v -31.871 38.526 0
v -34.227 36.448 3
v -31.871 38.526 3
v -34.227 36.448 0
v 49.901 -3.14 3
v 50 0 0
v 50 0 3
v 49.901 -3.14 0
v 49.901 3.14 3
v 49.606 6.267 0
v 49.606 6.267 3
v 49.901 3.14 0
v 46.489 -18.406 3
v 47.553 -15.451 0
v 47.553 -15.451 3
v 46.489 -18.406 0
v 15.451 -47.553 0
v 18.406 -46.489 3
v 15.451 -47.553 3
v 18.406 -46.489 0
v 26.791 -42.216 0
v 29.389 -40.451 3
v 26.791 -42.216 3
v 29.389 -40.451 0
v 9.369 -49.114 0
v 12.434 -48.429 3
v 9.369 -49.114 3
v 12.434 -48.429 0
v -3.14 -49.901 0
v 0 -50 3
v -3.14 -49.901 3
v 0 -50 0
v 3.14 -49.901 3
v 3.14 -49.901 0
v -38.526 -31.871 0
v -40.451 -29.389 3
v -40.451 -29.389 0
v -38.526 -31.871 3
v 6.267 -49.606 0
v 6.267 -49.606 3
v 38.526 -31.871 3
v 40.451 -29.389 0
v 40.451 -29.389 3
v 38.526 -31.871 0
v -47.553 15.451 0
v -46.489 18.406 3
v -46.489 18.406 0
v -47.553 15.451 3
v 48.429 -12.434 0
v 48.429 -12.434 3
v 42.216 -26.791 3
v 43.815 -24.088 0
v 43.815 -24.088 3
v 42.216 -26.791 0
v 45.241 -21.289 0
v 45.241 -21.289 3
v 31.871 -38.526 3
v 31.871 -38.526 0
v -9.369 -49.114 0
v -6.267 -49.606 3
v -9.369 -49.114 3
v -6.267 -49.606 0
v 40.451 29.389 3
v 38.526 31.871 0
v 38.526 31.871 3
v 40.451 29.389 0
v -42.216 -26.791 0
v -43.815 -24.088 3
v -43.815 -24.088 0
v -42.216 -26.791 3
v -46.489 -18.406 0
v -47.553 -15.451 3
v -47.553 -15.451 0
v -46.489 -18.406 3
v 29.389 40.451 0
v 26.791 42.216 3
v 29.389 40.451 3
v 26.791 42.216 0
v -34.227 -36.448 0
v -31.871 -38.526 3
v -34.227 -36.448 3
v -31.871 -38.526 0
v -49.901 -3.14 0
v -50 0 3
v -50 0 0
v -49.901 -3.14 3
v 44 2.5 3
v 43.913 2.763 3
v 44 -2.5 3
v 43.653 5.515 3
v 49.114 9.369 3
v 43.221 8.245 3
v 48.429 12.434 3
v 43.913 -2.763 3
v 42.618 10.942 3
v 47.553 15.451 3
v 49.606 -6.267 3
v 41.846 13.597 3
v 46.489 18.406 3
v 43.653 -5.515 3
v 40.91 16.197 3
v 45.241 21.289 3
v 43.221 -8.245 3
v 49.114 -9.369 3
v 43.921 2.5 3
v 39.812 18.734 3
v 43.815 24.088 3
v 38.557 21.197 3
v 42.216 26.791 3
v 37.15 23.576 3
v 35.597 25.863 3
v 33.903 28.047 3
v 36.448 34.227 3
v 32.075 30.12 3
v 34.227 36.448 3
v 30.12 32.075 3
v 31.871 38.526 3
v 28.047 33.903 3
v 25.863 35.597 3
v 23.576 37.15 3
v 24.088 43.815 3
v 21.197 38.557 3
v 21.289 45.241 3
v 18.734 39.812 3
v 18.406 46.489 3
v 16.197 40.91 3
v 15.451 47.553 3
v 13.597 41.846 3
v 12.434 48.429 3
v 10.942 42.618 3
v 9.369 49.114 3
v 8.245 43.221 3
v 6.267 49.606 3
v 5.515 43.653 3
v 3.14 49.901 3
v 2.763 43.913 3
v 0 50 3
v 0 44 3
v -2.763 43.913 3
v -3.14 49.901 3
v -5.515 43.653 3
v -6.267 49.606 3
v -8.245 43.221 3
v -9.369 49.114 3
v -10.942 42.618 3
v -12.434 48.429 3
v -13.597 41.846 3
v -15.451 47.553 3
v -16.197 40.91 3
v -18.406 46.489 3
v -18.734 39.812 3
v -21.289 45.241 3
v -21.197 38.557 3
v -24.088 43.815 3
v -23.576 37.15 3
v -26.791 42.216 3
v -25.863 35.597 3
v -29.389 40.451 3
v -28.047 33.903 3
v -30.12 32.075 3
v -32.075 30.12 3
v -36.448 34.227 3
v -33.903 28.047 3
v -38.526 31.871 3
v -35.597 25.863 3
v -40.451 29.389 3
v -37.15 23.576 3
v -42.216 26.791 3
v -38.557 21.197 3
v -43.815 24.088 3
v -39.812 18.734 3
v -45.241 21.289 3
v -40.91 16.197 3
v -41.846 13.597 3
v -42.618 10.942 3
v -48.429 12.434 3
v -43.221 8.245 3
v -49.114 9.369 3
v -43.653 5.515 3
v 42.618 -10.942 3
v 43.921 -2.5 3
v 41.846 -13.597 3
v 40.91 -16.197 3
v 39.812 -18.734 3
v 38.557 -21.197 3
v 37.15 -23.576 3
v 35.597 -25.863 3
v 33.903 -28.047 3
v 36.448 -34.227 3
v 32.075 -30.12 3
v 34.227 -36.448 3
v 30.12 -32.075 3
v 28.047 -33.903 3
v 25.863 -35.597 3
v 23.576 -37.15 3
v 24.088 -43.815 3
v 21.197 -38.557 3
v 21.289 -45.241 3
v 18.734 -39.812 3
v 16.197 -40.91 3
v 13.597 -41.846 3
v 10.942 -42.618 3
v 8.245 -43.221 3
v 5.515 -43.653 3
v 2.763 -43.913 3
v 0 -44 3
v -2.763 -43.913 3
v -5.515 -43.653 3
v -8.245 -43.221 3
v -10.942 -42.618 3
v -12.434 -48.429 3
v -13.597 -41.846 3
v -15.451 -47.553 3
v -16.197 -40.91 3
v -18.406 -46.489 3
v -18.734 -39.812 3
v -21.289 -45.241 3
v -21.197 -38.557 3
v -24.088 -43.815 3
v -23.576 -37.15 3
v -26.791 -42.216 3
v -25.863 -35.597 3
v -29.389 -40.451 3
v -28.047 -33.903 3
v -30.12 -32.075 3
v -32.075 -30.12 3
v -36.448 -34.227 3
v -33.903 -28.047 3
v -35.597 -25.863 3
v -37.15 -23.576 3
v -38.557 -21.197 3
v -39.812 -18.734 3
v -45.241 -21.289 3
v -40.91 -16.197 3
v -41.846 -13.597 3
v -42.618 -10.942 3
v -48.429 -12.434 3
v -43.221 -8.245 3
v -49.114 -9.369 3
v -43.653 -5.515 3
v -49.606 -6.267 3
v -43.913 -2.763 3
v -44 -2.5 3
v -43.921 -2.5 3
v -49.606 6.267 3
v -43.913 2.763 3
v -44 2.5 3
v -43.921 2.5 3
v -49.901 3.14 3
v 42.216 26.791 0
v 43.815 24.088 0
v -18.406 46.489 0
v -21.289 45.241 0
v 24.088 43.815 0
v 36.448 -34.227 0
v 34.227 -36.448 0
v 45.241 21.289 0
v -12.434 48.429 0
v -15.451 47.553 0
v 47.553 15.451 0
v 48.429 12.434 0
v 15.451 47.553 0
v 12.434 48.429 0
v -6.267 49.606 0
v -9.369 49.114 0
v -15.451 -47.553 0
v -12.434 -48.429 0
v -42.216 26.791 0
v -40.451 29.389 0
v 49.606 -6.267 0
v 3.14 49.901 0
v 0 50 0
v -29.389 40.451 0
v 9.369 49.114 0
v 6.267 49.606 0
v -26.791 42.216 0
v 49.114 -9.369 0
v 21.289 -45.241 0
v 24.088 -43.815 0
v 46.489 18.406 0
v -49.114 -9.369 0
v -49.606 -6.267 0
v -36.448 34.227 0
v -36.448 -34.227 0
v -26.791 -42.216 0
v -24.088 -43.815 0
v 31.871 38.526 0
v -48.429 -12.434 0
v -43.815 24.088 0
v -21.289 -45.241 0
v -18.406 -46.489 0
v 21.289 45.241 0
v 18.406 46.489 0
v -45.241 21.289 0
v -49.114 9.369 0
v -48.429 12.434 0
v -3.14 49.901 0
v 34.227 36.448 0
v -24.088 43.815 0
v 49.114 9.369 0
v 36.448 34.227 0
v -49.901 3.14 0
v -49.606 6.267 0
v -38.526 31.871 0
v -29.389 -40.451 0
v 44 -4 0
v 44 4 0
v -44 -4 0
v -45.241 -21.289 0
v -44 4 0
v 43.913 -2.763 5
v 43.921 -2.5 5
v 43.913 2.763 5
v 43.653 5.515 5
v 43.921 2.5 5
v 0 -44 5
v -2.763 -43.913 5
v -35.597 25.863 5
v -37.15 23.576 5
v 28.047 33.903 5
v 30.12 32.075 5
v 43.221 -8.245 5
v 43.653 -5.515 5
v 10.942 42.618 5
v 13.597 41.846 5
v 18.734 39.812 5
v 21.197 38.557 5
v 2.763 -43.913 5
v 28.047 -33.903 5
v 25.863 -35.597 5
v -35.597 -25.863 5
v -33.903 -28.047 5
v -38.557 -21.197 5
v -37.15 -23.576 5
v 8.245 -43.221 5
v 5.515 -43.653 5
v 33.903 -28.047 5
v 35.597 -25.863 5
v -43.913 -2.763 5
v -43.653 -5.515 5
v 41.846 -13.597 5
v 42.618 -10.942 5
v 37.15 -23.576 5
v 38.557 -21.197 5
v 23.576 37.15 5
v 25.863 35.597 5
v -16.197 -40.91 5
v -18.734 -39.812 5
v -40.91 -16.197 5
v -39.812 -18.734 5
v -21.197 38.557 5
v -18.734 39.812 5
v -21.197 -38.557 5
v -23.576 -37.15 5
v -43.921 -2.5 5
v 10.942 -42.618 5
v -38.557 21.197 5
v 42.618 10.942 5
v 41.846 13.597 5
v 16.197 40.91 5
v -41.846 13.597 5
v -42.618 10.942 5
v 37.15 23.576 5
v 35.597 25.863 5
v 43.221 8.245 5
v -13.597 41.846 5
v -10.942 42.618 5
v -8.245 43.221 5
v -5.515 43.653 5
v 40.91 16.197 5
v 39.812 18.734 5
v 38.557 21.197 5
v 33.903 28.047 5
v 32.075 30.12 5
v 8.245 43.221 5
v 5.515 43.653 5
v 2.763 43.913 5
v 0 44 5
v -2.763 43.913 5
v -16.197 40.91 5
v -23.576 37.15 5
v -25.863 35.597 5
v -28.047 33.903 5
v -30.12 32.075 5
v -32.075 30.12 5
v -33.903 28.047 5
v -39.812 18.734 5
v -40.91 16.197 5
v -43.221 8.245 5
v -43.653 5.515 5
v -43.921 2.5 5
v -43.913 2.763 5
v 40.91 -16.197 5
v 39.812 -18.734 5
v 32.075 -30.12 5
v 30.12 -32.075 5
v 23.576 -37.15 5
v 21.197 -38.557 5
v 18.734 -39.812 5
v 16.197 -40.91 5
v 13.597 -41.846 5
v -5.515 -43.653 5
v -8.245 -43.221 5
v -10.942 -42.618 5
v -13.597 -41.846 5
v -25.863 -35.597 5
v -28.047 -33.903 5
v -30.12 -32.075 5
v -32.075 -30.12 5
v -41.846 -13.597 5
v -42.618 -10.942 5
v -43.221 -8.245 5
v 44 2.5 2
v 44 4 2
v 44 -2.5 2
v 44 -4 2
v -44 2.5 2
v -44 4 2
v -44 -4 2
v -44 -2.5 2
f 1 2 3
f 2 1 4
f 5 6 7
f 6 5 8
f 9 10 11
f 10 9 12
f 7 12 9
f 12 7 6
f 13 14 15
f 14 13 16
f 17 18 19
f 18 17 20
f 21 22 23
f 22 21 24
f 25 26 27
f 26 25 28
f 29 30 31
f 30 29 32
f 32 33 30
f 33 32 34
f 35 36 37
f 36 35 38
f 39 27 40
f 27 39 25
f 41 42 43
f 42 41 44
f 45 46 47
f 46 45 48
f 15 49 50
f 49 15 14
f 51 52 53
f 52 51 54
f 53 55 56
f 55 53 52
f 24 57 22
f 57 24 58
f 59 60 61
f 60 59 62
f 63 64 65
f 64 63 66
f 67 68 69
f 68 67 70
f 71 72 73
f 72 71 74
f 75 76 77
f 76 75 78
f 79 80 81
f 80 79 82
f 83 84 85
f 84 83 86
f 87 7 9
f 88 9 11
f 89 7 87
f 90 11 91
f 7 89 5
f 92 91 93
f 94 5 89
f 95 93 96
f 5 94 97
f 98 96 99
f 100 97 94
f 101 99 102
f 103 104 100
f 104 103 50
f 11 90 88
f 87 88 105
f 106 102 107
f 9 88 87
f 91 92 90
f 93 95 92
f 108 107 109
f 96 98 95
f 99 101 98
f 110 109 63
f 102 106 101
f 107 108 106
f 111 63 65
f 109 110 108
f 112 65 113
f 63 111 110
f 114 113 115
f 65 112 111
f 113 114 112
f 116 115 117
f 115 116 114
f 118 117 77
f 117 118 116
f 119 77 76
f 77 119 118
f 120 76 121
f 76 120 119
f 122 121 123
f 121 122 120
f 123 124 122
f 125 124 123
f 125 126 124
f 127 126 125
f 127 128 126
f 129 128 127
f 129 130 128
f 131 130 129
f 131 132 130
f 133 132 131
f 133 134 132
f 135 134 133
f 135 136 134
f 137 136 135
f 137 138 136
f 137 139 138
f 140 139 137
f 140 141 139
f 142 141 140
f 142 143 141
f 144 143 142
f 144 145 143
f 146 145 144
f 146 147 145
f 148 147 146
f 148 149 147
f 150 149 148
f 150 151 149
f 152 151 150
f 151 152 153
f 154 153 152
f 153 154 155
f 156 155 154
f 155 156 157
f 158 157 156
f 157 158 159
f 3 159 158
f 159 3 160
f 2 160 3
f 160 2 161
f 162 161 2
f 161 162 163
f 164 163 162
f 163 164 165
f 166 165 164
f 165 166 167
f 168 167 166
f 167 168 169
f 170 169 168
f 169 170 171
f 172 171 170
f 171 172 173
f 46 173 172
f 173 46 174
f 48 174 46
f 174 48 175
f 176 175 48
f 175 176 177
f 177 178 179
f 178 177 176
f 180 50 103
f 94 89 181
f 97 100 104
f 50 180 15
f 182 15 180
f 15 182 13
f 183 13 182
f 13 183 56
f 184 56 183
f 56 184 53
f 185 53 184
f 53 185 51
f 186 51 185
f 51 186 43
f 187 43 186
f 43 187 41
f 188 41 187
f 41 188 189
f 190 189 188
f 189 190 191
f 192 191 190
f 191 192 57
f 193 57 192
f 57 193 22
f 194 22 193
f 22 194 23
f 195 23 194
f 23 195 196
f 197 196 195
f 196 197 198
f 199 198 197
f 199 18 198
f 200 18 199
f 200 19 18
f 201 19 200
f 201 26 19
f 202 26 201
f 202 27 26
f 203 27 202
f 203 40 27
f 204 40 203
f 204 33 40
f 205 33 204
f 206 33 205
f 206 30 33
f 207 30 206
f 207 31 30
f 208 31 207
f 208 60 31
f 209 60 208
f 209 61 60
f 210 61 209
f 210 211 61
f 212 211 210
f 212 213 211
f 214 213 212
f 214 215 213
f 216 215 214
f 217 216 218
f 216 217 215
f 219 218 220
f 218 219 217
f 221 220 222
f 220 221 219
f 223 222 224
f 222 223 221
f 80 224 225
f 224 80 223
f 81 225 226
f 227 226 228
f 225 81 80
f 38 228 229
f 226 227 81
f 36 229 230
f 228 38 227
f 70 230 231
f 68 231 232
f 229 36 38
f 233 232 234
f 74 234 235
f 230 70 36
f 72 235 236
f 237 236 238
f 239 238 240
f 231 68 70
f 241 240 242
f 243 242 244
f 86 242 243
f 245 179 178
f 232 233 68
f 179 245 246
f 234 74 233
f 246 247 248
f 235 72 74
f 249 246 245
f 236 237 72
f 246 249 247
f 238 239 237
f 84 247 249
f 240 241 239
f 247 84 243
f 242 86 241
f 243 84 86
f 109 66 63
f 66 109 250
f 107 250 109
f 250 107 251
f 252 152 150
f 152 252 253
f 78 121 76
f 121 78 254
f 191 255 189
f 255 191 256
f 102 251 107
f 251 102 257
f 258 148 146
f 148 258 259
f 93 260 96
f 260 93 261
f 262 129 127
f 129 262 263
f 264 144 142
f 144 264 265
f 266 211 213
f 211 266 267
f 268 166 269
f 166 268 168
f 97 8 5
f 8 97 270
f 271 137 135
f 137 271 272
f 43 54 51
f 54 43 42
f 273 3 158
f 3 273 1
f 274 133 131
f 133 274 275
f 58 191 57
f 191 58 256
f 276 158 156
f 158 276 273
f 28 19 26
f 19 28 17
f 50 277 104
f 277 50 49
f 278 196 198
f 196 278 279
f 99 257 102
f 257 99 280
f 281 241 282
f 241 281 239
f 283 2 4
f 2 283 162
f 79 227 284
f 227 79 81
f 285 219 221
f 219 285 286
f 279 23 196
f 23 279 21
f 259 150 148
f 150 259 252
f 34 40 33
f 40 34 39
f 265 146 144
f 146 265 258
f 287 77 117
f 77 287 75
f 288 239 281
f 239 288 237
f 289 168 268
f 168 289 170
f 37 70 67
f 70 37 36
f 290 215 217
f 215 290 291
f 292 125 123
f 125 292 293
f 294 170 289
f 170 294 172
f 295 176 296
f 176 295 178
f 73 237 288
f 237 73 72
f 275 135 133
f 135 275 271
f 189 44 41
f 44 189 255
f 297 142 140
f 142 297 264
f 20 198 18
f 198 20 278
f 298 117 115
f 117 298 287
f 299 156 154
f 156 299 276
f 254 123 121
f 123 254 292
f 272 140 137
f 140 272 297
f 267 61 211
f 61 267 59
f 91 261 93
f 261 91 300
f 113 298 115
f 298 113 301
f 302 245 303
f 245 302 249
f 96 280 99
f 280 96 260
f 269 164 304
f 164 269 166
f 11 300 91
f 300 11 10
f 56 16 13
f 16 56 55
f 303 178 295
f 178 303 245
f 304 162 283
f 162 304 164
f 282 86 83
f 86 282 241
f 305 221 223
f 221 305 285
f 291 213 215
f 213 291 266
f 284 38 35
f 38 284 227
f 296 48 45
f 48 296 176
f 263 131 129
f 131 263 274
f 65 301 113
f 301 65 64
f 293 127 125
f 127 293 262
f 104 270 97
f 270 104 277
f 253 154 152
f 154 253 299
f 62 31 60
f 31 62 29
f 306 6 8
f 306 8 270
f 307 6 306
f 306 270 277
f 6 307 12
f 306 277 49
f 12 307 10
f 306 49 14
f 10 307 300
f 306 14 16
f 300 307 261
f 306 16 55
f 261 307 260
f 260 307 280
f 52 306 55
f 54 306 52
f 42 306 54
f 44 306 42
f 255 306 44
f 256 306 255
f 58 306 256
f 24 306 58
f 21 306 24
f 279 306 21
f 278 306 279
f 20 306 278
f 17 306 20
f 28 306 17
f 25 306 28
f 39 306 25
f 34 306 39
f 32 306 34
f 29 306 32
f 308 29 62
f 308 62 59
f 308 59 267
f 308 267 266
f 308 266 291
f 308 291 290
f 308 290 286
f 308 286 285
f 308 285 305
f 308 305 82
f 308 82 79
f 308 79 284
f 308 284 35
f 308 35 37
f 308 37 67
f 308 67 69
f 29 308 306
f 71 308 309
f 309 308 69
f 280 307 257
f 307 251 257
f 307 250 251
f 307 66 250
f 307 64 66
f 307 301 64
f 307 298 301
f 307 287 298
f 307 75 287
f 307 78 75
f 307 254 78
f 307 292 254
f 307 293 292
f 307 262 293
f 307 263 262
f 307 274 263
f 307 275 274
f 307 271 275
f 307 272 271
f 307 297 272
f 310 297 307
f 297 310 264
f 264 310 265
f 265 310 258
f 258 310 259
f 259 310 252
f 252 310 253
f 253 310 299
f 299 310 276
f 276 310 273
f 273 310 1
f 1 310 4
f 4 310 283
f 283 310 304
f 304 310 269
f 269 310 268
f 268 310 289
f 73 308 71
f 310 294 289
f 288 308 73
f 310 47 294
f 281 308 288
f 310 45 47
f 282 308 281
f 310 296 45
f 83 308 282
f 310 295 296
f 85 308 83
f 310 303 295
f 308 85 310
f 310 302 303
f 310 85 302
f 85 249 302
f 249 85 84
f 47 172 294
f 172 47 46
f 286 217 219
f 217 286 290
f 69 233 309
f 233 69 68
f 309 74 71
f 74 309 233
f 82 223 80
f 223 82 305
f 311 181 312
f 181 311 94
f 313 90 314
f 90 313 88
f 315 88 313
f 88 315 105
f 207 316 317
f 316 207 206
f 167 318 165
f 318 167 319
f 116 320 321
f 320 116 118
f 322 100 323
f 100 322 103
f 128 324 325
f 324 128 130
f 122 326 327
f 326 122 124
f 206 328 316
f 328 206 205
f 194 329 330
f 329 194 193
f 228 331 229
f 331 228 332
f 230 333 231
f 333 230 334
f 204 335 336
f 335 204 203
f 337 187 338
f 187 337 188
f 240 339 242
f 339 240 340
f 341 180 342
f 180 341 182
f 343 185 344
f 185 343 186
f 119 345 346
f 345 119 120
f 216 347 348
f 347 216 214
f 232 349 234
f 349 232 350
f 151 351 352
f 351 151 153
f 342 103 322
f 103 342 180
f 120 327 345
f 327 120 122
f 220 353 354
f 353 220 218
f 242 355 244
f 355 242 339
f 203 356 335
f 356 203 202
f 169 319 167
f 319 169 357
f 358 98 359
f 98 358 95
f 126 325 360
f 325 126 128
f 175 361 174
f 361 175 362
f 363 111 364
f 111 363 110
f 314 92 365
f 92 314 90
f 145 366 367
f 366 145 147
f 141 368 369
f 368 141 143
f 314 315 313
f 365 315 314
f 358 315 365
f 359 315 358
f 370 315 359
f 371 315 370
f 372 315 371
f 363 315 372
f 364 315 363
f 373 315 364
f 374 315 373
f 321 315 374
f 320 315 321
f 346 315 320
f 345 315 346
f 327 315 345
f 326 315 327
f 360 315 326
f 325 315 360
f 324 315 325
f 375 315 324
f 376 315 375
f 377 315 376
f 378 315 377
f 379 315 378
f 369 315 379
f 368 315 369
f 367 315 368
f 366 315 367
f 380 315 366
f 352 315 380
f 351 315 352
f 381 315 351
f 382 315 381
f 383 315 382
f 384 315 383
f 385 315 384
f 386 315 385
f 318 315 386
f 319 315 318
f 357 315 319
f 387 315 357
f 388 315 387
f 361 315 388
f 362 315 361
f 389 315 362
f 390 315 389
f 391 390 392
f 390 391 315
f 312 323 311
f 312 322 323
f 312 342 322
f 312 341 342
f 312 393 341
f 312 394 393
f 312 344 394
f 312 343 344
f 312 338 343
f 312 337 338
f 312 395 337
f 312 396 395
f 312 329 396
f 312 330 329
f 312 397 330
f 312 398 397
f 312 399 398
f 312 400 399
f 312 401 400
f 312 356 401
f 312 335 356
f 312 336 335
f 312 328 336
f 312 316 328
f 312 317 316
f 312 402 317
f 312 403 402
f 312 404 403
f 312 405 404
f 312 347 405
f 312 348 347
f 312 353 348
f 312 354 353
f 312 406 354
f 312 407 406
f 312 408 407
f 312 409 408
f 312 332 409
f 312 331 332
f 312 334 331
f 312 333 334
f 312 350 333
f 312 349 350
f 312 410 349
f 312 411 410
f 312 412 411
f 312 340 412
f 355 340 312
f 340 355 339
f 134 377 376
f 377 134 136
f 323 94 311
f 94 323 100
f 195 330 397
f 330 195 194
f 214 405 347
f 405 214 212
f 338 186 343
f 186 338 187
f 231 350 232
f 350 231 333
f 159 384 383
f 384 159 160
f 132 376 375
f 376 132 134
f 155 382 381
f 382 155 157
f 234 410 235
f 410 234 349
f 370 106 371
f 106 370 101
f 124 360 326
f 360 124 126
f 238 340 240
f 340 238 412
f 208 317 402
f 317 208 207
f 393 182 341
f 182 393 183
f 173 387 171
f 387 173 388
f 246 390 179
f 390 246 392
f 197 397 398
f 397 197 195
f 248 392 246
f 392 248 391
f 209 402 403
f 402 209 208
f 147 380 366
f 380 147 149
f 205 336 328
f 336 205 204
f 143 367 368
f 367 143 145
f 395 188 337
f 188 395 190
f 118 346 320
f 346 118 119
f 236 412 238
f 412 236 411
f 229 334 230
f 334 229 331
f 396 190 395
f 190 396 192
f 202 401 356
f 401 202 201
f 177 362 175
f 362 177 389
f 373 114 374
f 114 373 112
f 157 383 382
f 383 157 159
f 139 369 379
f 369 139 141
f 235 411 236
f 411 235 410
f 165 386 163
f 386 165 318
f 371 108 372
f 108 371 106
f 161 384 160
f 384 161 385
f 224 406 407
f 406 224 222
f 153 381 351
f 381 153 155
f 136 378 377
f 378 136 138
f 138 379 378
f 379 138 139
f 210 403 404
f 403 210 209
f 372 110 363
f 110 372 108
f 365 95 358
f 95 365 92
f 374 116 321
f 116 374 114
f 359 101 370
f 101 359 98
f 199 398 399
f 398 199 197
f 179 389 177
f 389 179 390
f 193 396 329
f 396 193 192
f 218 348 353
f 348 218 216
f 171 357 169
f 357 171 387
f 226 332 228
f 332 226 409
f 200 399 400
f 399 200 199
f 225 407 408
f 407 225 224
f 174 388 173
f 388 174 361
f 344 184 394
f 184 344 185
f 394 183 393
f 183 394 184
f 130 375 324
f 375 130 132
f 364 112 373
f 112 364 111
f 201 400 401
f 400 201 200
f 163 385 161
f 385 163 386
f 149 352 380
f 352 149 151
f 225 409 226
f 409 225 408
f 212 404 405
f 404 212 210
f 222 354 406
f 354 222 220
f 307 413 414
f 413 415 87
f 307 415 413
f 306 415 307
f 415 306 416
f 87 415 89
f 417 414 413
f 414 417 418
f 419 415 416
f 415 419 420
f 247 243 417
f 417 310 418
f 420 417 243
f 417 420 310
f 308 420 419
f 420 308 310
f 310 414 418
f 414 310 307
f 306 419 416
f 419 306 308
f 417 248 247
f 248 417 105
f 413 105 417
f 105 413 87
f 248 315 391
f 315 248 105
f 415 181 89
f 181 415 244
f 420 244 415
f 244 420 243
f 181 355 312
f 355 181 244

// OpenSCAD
difference() {
  union() {
    cylinder (h = 3, r=50, center = false, $fn=100);
    cylinder (h = 5, r=44, center = false, $fn=100);
  }
  translate([-44,-4,-1])
    cube([88,8,3]);
  translate([-44,-2.5,-1])
    cube([88,5,100]);
}
